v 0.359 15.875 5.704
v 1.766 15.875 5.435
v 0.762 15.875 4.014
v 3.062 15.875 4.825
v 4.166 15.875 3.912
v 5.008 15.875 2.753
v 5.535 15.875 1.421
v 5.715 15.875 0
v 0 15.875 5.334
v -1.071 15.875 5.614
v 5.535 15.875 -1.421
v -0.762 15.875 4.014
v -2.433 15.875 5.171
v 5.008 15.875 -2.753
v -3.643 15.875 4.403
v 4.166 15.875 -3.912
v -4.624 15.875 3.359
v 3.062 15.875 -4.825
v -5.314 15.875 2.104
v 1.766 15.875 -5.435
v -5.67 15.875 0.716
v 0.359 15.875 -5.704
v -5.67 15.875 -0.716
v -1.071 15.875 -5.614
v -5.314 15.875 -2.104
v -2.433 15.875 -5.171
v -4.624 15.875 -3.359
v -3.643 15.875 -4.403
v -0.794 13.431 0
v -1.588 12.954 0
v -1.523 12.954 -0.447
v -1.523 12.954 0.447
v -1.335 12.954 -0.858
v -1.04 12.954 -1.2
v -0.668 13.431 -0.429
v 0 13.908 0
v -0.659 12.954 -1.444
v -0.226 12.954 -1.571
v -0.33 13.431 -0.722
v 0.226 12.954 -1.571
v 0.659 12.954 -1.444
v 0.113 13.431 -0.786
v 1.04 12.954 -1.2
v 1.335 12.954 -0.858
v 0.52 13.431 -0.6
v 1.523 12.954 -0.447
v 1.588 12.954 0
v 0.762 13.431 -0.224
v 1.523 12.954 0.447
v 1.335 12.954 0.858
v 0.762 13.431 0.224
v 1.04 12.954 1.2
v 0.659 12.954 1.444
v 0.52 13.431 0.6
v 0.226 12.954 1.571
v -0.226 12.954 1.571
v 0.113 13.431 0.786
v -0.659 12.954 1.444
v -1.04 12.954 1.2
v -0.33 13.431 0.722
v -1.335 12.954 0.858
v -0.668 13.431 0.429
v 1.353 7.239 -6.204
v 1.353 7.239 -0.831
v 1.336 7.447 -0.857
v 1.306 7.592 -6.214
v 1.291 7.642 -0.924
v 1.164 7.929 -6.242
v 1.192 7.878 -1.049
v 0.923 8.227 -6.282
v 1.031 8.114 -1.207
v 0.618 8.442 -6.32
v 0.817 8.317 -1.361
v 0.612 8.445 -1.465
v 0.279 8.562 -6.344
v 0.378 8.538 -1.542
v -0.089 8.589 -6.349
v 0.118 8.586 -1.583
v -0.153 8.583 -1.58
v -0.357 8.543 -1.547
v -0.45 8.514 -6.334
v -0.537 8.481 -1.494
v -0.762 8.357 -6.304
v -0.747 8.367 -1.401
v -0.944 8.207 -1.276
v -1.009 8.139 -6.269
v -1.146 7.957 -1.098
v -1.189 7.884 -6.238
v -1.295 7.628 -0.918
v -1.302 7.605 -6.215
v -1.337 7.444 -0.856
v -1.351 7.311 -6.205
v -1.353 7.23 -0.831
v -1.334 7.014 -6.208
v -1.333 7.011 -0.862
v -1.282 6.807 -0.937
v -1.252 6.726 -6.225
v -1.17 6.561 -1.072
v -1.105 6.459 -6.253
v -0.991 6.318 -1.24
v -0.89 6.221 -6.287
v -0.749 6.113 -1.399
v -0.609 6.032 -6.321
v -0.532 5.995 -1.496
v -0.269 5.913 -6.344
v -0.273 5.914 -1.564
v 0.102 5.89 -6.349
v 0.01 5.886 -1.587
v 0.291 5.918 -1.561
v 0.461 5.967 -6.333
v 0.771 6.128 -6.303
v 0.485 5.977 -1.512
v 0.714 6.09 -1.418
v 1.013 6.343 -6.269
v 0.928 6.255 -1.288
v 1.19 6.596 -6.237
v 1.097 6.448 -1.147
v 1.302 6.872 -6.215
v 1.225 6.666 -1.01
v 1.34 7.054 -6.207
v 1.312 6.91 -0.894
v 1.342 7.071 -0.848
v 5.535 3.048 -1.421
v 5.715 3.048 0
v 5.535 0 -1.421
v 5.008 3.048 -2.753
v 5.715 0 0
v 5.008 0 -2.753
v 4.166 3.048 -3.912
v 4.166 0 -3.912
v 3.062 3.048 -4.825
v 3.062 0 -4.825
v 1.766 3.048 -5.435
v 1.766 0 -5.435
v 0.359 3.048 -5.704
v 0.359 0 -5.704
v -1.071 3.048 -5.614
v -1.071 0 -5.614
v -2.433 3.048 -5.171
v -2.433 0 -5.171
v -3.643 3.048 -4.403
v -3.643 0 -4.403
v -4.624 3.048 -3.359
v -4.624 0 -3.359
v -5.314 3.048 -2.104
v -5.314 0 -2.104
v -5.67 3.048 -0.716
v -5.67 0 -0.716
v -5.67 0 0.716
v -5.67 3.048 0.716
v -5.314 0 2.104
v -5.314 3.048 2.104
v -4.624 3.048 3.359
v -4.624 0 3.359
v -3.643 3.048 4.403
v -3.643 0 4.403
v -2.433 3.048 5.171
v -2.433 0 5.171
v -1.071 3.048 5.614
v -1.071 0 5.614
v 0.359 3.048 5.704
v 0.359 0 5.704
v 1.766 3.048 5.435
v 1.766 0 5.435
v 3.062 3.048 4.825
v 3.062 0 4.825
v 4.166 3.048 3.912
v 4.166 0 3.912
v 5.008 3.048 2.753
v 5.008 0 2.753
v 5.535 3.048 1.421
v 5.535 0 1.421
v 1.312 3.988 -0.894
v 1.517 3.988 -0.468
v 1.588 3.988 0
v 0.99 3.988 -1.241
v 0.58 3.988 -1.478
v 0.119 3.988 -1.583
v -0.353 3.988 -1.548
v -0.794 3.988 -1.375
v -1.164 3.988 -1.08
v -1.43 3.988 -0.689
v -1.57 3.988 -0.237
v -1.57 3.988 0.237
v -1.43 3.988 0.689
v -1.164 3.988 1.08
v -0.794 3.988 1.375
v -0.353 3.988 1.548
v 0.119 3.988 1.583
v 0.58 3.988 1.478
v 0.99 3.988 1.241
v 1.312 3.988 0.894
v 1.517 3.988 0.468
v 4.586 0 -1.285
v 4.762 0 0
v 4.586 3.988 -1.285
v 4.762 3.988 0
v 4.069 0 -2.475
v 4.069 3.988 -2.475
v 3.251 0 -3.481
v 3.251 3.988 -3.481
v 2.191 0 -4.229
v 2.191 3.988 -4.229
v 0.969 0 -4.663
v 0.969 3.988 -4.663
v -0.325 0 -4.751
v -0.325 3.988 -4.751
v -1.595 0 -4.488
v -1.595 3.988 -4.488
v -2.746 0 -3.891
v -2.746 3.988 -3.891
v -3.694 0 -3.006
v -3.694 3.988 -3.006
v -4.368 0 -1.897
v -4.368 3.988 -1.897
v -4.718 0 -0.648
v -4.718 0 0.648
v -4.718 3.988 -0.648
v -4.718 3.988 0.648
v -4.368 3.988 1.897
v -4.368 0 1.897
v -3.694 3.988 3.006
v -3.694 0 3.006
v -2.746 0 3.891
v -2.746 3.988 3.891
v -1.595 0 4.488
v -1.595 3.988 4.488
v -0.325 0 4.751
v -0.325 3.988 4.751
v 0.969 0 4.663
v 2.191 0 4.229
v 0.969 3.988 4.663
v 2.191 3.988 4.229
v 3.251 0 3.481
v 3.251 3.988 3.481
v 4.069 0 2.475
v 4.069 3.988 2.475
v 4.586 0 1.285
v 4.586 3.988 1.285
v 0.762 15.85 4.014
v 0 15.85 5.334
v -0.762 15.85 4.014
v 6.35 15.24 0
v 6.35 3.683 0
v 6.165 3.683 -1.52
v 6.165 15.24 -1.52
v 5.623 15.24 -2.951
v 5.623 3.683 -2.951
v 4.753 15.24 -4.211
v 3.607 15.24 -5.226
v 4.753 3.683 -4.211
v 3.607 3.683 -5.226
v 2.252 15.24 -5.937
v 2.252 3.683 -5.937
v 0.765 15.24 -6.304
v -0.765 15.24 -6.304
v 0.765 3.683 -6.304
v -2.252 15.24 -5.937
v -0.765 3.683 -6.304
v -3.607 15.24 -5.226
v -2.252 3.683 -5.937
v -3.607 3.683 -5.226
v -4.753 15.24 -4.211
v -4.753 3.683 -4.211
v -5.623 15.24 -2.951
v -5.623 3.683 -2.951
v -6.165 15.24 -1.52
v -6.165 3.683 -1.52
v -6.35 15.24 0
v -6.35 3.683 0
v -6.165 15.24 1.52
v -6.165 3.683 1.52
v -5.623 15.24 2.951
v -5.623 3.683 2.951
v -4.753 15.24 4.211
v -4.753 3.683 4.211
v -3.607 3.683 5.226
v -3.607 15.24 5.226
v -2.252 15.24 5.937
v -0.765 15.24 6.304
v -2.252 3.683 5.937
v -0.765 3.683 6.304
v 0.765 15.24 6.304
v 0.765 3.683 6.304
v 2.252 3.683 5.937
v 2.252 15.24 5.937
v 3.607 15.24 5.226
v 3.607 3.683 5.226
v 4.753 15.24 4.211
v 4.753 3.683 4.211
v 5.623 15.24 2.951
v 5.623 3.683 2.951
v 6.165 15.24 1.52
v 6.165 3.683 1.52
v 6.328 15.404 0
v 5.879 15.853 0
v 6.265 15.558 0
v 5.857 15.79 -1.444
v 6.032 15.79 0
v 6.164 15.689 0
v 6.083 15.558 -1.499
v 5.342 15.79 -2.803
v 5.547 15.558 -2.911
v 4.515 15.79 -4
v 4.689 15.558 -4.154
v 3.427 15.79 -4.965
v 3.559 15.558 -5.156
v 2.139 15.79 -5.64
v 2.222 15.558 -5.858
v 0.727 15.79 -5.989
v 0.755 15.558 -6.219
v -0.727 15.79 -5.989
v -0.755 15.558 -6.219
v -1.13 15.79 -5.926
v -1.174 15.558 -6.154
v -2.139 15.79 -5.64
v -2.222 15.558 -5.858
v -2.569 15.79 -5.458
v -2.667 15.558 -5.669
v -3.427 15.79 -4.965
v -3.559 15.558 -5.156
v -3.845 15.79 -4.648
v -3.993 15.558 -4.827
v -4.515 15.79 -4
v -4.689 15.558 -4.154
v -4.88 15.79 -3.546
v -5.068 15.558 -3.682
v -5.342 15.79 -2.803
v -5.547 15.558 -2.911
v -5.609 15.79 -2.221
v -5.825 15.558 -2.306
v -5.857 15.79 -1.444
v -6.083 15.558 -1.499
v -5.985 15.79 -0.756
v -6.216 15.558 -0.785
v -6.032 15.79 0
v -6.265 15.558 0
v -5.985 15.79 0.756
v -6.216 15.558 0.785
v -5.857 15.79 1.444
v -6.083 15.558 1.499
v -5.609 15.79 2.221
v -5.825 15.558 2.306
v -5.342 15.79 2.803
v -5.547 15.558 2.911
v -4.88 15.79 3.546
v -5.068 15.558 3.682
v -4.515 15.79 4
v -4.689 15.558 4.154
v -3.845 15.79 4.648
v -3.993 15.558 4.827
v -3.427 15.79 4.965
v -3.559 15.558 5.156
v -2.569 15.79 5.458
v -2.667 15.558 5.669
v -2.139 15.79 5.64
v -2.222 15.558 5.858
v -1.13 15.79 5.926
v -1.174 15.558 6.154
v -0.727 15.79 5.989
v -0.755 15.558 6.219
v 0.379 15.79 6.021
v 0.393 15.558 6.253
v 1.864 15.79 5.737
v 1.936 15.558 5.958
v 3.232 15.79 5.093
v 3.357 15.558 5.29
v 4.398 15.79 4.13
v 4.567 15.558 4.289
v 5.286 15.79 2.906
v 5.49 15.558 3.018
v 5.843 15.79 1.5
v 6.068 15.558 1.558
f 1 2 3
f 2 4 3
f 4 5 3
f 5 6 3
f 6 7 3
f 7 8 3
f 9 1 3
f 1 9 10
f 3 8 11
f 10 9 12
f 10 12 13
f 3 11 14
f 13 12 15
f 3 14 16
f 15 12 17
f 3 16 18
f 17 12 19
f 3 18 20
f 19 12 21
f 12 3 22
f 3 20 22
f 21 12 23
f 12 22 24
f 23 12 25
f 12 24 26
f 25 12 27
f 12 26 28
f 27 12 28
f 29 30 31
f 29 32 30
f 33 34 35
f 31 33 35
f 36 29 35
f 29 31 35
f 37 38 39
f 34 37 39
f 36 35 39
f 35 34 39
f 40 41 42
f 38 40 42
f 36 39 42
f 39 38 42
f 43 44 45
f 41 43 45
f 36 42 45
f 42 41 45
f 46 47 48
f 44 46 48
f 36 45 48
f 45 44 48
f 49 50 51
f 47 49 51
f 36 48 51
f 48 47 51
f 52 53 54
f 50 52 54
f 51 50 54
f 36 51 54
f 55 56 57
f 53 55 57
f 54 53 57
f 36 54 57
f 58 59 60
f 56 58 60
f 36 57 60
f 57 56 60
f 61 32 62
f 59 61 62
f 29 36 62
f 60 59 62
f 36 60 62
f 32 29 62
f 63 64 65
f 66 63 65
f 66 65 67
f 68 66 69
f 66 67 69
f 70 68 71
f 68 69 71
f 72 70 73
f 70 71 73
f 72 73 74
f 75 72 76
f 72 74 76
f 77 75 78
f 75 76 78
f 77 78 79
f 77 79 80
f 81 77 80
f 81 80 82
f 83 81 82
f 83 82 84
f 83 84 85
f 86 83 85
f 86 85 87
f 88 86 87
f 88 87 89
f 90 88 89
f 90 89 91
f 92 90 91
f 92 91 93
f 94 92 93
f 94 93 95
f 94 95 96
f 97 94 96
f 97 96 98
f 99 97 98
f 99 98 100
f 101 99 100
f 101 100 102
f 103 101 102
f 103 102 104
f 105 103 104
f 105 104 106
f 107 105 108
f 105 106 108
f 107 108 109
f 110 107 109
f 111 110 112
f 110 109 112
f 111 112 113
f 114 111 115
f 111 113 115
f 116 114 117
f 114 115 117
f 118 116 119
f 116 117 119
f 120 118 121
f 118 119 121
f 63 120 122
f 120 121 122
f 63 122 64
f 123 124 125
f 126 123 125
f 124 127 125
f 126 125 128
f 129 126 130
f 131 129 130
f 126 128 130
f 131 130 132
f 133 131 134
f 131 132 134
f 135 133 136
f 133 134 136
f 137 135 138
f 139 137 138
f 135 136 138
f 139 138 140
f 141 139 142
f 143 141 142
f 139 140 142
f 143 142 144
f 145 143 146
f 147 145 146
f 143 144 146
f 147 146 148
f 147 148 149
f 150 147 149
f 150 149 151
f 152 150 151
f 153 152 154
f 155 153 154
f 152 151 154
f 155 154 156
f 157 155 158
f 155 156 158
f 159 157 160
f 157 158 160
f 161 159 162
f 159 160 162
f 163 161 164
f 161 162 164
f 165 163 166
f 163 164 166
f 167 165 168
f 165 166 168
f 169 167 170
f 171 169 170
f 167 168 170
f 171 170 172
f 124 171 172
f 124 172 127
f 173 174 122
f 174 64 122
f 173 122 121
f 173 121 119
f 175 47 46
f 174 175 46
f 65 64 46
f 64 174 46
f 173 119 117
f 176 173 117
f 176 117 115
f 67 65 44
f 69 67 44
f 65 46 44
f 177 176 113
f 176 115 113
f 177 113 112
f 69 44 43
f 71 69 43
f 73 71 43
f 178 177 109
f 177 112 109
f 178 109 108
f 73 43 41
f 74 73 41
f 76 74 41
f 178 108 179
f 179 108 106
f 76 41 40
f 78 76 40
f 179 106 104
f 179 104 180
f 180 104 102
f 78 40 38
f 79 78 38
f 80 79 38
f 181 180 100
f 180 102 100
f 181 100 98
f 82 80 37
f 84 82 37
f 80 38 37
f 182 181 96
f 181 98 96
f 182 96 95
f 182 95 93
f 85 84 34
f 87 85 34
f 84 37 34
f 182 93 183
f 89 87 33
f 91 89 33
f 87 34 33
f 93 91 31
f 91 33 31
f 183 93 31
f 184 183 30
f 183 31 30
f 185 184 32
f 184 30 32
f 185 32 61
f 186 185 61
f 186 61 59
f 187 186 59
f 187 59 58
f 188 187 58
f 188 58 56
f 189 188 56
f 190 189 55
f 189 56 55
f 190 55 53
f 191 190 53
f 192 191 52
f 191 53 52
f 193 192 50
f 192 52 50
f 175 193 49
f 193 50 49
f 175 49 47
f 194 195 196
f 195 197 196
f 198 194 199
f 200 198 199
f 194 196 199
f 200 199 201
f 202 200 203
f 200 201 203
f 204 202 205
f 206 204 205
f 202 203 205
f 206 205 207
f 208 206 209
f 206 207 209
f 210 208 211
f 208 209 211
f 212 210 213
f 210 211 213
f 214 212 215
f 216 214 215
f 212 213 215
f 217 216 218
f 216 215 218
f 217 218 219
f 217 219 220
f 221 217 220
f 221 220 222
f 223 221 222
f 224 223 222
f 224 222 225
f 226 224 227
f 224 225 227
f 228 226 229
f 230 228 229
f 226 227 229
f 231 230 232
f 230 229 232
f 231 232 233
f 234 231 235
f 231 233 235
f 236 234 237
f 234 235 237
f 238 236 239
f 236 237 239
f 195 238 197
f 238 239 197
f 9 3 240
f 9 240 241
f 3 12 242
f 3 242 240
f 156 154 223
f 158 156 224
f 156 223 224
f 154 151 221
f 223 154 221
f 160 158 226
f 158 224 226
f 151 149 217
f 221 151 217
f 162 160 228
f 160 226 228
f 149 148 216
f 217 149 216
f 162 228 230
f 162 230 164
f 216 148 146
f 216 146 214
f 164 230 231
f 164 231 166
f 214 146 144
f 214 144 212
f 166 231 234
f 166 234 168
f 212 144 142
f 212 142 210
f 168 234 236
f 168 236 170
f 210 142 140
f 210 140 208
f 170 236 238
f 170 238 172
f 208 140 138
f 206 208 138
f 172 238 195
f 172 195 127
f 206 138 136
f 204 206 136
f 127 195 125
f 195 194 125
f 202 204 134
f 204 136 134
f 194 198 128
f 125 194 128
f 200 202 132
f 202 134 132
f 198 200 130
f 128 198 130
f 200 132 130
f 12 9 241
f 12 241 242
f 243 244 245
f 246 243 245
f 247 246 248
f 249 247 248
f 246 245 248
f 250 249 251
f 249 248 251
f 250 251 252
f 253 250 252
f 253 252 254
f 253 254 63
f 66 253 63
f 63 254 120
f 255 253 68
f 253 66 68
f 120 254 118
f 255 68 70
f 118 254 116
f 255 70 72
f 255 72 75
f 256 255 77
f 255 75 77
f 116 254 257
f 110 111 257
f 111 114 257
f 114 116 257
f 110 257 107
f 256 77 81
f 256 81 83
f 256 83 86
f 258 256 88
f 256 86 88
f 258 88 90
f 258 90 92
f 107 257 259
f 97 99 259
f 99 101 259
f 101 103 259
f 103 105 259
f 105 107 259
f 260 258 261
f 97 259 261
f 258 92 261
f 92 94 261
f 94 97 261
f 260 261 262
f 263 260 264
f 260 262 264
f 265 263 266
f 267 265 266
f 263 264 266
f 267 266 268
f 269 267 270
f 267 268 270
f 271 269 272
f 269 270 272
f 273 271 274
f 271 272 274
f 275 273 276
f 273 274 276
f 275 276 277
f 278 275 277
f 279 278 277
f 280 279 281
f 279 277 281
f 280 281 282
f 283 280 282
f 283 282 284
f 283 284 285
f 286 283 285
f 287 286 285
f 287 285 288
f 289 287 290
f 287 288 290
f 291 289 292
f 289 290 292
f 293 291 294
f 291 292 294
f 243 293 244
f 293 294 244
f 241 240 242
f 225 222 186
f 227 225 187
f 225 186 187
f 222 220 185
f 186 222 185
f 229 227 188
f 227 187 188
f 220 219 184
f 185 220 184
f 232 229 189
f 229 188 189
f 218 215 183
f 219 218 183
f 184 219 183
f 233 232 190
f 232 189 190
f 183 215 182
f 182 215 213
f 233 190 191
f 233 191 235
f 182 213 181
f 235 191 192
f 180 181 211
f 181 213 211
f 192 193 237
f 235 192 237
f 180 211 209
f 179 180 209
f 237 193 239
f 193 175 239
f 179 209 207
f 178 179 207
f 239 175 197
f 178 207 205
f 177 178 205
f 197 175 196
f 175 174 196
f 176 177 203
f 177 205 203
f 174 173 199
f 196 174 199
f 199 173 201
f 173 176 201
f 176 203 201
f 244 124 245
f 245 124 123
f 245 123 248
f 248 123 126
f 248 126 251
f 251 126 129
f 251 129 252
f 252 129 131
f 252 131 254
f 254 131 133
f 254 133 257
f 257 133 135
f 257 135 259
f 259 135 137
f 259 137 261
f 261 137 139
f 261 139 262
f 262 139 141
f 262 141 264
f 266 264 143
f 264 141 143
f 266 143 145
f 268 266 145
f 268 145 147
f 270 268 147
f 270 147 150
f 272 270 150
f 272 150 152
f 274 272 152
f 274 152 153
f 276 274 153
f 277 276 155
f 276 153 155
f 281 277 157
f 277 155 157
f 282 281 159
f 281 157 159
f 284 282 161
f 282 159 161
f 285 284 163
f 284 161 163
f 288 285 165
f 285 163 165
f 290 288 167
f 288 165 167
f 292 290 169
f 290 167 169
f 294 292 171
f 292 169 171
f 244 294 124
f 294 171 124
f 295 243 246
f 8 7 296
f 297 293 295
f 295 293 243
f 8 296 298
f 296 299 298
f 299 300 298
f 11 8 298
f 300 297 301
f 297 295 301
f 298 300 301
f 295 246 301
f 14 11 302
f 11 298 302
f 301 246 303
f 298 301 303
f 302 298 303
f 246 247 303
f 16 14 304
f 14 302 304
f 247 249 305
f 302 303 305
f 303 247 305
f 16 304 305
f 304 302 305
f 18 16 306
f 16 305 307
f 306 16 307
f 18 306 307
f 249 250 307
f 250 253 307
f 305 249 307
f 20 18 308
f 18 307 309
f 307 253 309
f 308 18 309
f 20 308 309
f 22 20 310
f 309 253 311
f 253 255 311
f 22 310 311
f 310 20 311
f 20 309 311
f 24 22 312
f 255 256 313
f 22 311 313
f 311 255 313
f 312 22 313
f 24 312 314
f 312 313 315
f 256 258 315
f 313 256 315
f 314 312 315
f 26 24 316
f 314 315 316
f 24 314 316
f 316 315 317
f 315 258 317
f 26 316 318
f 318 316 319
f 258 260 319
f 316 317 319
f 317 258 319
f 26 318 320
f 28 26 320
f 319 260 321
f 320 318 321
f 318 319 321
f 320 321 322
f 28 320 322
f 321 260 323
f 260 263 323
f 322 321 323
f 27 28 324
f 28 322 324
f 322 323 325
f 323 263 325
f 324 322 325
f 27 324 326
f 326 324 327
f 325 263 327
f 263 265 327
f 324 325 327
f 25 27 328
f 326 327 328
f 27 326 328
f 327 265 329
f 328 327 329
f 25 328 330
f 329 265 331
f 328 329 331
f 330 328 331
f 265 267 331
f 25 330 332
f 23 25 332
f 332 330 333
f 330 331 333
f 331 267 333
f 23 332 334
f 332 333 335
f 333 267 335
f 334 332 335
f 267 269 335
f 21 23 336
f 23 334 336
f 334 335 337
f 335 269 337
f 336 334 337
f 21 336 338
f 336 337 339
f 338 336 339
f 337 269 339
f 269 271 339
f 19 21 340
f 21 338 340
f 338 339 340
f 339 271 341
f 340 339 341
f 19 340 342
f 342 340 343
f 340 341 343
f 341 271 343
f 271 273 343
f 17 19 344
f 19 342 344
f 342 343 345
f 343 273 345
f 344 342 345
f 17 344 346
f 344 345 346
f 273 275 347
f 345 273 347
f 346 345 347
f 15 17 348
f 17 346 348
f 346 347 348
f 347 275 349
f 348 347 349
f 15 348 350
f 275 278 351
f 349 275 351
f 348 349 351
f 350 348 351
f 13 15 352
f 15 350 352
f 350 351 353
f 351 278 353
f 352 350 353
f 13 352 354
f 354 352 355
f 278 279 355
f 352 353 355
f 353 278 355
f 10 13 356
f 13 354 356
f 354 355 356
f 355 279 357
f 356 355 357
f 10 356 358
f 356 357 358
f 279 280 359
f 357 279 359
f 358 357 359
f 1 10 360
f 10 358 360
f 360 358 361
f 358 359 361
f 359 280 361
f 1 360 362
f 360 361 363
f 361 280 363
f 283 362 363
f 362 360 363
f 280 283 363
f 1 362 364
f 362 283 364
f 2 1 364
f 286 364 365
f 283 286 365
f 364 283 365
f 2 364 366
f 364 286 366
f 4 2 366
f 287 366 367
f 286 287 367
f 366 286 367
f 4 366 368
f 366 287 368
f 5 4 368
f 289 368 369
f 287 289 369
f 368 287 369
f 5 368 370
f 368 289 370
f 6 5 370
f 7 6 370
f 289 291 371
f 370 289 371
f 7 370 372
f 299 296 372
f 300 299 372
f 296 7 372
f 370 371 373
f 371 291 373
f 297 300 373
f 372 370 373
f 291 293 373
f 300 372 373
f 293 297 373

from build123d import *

# Parameters (mm, degrees)
F_1_8_0_125_DIAMETER_HOLE1_D     = 3.175
F_1_8_0_125_DIAMETER_HOLE1_DEPTH = 12.954
F_1_8_0_125_DIAMETER_HOLE1_TIP   = 0.953866233
F_6_32_TAPPED_HOLE1_D            = 2.7051
F_6_32_TAPPED_HOLE1_DEPTH        = 6.349
F_6_32_TAPPED_HOLE1_TIP          = 0.81269403
FILLET1_R                        = 0.635
CUT_EXTRUDE1_DEPTH               = 0.0254


with BuildPart() as part:
    # Sketch1 → Revolve1 (revolve)
    with BuildSketch(Plane.XY):
        Polygon((0, 15.875), (6.35, 15.875), (6.35, 3.683), (5.715, 3.048), (5.715, 0), (4.7625, 0), (4.7625, 3.9878), (0, 3.9878), align=None)
    revolve(axis=Axis((0, 0, 0), (0, 1, 0)))

    # 1/8 (0.125) Diameter Hole1
    with Locations(Plane(origin=(0, 0, 0), x_dir=(-1, 0, 0), z_dir=(0, -1, 0))):
        with Locations((0, 0)):
            Hole(F_1_8_0_125_DIAMETER_HOLE1_D / 2, depth=F_1_8_0_125_DIAMETER_HOLE1_DEPTH)
            with Locations((0, 0, -(F_1_8_0_125_DIAMETER_HOLE1_DEPTH + F_1_8_0_125_DIAMETER_HOLE1_TIP / 2))):  # 118° drill point
                Cone(0, F_1_8_0_125_DIAMETER_HOLE1_D / 2, F_1_8_0_125_DIAMETER_HOLE1_TIP, mode=Mode.SUBTRACT)

    # #6-32 Tapped Hole1
    with Locations(Plane(origin=(0, 0, -6.35), x_dir=(-1, 0, 0), z_dir=(0, 0, -1))):
        with Locations((0, 7.239)):
            Hole(F_6_32_TAPPED_HOLE1_D / 2, depth=F_6_32_TAPPED_HOLE1_DEPTH)
            with Locations((0, 0, -(F_6_32_TAPPED_HOLE1_DEPTH + F_6_32_TAPPED_HOLE1_TIP / 2))):  # 118° drill point
                Cone(0, F_6_32_TAPPED_HOLE1_D / 2, F_6_32_TAPPED_HOLE1_TIP, mode=Mode.SUBTRACT)

    # Fillet1
    fillet1_edges = [part.edges().sort_by_distance(p)[0] for p in [
        (-6.35, 15.875, 0),
    ]]
    fillet(fillet1_edges, radius=FILLET1_R)

    # Sketch6 → Cut-Extrude1 (cut)
    with BuildSketch(Plane(origin=(0, 15.875, 0), x_dir=(1, 0, 0), z_dir=(0, 1, 0))):
        Polygon((0, -5.334), (-0.762, -4.014177285), (0.762, -4.014177285), align=None)
    extrude(amount=-CUT_EXTRUDE1_DEPTH, mode=Mode.SUBTRACT)


solid = part.part
